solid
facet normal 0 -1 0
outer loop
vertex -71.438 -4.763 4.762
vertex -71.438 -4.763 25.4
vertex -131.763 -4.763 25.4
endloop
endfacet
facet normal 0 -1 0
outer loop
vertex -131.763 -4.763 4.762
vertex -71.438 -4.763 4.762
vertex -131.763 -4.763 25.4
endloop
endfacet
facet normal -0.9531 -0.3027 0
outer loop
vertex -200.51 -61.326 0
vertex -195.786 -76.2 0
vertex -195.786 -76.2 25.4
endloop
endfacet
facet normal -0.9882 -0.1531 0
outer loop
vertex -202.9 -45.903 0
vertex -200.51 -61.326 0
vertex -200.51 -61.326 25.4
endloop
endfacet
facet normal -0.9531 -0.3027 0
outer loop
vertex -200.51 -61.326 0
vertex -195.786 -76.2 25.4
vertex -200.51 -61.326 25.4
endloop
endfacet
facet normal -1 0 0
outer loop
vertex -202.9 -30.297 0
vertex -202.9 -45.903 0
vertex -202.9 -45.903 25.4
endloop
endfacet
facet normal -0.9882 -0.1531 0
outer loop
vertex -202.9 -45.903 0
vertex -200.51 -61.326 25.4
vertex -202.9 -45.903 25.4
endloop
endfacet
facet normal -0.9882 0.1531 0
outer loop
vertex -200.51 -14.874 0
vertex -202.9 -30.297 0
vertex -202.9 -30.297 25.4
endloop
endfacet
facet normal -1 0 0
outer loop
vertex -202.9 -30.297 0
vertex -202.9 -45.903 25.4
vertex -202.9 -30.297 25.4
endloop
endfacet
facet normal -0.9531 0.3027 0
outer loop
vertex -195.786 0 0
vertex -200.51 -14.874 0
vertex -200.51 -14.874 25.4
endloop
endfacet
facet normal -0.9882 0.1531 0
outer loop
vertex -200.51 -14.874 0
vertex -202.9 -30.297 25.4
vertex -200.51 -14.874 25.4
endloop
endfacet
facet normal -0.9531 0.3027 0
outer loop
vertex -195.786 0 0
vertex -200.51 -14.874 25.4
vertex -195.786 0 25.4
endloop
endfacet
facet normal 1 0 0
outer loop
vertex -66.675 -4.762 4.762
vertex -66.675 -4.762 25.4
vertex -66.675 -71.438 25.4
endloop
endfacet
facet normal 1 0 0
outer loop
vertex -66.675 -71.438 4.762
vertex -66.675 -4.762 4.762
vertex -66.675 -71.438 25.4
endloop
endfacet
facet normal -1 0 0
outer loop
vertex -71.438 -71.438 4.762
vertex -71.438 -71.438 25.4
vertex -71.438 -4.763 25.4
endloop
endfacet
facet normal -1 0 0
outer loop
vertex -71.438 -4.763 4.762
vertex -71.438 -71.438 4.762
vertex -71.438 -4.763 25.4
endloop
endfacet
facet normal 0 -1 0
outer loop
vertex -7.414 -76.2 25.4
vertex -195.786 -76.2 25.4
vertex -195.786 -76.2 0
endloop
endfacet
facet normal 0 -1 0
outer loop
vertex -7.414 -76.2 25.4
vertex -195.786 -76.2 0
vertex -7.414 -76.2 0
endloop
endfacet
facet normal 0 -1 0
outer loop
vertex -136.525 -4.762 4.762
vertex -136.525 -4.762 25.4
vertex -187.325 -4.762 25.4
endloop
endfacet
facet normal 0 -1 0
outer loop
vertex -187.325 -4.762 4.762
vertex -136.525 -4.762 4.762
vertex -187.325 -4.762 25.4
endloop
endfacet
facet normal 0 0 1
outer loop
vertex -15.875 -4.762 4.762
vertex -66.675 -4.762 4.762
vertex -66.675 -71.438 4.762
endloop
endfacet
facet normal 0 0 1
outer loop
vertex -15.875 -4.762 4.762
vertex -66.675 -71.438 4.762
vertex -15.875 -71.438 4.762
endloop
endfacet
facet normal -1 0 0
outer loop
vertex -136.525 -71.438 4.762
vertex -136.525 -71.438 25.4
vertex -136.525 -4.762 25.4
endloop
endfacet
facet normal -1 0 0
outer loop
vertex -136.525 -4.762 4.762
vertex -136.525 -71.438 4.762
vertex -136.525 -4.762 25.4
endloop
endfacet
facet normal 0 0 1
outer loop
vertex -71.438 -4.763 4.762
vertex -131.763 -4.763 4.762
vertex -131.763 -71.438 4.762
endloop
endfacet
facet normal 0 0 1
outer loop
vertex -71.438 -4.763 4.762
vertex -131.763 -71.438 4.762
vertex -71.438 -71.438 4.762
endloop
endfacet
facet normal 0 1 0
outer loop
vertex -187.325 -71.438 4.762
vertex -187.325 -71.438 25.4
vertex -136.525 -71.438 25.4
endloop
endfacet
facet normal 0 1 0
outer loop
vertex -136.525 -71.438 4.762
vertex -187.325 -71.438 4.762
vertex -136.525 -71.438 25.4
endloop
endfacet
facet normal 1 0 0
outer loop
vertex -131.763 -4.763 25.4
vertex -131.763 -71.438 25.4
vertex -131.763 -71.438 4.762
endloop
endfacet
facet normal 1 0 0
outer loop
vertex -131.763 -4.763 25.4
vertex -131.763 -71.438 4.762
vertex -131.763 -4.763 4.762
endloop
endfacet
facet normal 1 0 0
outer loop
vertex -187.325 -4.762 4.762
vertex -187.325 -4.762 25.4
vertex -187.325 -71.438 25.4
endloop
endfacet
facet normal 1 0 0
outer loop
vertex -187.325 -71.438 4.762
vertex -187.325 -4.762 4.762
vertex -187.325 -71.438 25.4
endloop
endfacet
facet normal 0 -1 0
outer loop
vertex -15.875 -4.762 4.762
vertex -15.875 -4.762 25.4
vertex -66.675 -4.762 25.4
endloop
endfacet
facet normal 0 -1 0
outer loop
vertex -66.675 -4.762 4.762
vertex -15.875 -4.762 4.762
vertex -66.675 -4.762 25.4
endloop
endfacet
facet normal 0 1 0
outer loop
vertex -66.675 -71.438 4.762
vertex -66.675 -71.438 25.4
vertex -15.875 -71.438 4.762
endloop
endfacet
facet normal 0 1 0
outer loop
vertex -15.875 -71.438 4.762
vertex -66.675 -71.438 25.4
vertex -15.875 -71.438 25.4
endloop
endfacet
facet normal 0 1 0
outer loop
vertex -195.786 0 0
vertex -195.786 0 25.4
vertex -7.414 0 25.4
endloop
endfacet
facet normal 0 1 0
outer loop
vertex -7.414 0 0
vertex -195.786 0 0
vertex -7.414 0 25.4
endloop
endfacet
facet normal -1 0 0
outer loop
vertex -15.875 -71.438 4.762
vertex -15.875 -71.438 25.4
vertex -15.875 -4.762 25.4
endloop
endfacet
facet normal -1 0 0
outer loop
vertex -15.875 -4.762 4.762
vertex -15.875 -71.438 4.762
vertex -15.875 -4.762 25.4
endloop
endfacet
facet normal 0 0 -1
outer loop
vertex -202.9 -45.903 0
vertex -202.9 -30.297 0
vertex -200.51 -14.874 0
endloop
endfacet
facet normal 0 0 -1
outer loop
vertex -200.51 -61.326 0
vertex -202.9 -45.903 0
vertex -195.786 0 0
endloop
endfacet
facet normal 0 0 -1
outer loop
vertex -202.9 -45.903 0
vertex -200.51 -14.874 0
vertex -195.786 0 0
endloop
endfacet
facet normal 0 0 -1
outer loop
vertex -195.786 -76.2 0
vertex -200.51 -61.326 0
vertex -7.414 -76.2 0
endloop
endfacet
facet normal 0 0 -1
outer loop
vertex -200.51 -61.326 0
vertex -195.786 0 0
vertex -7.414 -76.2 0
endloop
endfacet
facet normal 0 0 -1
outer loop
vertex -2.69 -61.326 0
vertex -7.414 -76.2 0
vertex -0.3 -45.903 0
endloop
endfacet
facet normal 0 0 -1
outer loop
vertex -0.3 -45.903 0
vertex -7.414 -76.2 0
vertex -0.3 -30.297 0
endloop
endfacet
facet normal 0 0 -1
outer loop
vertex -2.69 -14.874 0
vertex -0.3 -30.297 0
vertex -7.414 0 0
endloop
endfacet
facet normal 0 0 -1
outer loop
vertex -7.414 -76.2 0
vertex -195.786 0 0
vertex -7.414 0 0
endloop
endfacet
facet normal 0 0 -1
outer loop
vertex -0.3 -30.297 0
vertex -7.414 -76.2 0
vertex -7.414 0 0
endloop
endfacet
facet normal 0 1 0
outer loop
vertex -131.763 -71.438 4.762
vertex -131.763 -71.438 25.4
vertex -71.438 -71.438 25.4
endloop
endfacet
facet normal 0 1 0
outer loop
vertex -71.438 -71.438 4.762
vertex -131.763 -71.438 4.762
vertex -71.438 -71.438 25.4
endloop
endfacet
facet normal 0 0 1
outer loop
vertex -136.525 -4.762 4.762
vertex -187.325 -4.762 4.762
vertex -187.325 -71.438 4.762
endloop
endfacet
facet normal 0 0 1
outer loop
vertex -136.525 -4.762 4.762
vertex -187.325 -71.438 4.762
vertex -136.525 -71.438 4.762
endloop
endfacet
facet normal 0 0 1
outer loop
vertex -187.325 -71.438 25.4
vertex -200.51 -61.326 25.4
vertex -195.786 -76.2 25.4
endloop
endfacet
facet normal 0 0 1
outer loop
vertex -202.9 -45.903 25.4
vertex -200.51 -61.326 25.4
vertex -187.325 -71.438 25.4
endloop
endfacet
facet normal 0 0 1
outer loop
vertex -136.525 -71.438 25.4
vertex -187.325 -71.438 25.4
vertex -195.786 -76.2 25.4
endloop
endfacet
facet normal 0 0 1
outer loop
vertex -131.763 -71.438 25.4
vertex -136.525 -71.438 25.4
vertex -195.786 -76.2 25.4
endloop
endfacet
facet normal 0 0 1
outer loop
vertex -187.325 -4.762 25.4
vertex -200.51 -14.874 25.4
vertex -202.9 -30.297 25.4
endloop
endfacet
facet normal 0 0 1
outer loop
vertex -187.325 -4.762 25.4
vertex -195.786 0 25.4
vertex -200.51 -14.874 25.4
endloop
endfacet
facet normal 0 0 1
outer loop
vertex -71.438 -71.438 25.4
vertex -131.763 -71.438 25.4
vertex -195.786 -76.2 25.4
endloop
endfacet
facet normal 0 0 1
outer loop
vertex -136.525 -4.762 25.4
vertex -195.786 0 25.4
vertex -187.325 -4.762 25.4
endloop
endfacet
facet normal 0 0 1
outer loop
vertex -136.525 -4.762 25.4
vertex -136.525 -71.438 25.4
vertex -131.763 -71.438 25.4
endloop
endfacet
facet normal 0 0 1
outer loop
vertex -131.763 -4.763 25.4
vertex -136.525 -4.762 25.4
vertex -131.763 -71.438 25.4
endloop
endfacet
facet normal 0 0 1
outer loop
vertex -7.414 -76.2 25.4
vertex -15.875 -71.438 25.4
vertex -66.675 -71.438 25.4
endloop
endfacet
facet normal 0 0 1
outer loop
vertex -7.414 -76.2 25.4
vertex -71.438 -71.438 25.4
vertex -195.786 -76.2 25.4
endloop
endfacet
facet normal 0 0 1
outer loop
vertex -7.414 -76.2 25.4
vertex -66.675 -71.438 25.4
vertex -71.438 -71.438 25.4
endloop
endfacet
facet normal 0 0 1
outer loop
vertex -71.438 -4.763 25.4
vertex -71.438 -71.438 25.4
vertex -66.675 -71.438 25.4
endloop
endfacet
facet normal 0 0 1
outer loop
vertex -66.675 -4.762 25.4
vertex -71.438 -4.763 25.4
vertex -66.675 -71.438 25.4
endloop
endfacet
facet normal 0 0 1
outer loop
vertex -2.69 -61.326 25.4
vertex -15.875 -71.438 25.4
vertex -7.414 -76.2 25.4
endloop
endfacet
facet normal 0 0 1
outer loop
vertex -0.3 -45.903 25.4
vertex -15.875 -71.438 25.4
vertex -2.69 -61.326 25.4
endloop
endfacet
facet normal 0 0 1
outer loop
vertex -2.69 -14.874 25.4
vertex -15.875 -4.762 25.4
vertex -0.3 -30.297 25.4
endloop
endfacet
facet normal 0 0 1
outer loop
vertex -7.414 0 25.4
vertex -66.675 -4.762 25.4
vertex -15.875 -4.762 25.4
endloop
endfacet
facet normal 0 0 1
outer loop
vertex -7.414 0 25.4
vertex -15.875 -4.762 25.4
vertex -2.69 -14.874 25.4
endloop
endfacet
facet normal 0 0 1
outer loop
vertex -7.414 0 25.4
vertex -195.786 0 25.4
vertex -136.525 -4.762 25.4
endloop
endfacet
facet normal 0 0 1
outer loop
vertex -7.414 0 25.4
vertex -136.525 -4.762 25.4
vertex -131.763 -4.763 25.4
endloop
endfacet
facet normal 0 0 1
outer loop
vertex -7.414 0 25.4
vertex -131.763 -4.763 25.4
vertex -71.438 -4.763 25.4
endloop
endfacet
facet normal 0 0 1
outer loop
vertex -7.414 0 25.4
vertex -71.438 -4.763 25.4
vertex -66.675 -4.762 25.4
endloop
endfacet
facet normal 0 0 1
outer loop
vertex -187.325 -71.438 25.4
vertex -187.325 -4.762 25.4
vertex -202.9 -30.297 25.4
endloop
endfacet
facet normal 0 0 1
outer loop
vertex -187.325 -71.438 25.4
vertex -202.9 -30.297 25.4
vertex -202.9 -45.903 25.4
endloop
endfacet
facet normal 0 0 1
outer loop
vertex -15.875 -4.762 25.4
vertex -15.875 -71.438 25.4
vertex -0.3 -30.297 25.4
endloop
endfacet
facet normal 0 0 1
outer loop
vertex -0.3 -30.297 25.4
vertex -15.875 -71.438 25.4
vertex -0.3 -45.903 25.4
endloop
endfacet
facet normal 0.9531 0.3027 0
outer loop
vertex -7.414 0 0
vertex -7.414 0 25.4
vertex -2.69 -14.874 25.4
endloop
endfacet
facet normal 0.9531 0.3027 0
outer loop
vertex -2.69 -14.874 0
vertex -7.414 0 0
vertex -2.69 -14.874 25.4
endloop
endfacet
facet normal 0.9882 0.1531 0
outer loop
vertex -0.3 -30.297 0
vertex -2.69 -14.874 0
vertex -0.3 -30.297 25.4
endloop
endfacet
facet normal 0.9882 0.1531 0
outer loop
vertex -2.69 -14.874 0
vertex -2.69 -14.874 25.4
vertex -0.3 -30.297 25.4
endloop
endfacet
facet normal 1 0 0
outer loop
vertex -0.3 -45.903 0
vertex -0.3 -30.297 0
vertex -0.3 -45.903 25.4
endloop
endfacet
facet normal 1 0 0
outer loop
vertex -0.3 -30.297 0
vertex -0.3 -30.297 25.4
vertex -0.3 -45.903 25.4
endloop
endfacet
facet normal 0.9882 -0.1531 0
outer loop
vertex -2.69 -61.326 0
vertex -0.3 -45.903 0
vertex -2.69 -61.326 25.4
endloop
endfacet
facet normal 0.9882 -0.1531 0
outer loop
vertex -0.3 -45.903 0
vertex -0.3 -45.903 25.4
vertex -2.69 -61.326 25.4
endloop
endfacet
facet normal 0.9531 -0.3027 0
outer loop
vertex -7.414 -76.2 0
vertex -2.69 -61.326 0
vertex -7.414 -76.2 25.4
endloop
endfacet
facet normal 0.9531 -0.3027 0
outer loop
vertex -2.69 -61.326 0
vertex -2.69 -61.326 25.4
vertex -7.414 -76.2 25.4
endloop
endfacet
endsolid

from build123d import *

# Parameters (mm, degrees)
F0_W     = 203.2
F0_H     = 25.4
F1_DEPTH = 76.2
F3_DEPTH = 25.4
F4_W     = 30.1625
F4_H     = 66.675
F5_DEPTH = 20.6375


with BuildPart() as f1:
    # F0 (on Front) → F1 (new body)
    with BuildSketch(Plane.XZ):
        with Locations((-101.6, 12.7)):
            Rectangle(F0_W, F0_H)
    extrude(amount=F1_DEPTH)

    # F2 (on face) → F3 (cut)
    with BuildSketch(Plane.XY.offset(25.4)):
        with BuildLine():
            Line((0, -76.2), (0, -38.1))
            ThreePointArc((0, -38.1), (-1.8707935661, -57.5073538656), (-7.4142792139, -76.2))
            Line((-7.4142792139, -76.2), (0, -76.2))
        make_face()
        with BuildLine():
            ThreePointArc((-7.4142792139, 0), (-1.8707935661, -18.6926461344), (0, -38.1))
            Line((0, -38.1), (0, 0))
            Line((0, 0), (-7.4142792139, 0))
        make_face()
        with BuildLine():
            ThreePointArc((-195.7857207861, -76.2), (-101.6, -139.7), (-7.4142792139, -76.2))
            Line((-7.4142792139, -76.2), (-195.7857207861, -76.2))
        make_face()
        with BuildLine():
            ThreePointArc((-203.2, -38.1), (-201.3292064339, -18.6926461344), (-195.7857207861, 0))
            Line((-195.7857207861, 0), (-203.2, 0))
            Line((-203.2, 0), (-203.2, -38.1))
        make_face()
        with BuildLine():
            Line((-203.2, -76.2), (-195.7857207861, -76.2))
            ThreePointArc((-195.7857207861, -76.2), (-201.3292064339, -57.5073538656), (-203.2, -38.1))
            Line((-203.2, -38.1), (-203.2, -76.2))
        make_face()
    extrude(amount=-F3_DEPTH, mode=Mode.SUBTRACT)

    # F4 (on face) → F5 (cut)
    with BuildSketch(Plane.XY.offset(25.4)):
        Polygon((-187.325, -4.7625), (-187.325, -38.1), (-187.325, -71.4375), (-136.525, -71.4375), (-136.525, -4.7625), align=None)
        Polygon((-15.875, -71.4375), (-15.875, -38.1), (-15.875, -4.7625), (-66.675, -4.7625), (-66.675, -71.4375), align=None)
        with Locations((-86.51875, -38.1)):
            Rectangle(F4_W, F4_H)
        with Locations((-116.68125, -38.1)):
            Rectangle(F4_W, F4_H)
    extrude(amount=-F5_DEPTH, mode=Mode.SUBTRACT)


solid = f1.part
